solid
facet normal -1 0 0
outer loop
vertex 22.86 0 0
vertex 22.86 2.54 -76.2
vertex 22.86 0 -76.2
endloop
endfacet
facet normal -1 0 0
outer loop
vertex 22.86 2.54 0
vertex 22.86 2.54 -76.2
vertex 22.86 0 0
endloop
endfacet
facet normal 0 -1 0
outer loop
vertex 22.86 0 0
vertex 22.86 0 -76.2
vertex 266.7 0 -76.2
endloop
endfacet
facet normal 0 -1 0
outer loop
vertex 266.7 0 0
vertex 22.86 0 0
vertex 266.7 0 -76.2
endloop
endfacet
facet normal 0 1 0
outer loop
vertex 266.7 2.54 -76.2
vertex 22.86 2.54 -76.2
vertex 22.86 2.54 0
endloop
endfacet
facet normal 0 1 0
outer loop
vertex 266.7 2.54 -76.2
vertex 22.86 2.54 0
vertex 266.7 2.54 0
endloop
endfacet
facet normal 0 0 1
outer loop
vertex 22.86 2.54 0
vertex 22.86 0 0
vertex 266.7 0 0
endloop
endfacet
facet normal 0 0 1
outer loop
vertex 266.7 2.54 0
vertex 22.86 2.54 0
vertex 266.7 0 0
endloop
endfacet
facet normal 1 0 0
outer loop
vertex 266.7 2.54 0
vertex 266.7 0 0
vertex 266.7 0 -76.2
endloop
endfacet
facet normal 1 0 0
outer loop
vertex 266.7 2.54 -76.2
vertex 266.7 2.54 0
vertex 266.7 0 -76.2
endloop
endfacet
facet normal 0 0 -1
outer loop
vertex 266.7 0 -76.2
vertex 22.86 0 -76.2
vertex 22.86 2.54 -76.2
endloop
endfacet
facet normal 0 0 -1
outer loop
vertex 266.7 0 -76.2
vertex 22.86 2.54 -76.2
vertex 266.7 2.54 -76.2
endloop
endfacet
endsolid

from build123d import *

# Parameters (mm, degrees)
SKETCH2_W           = 266.7
SKETCH2_H           = 76.2
BOSS_EXTRUDE2_DEPTH = 2.54
SKETCH3_W           = 106.044360615
SKETCH3_H           = 67.366643484
CUT_EXTRUDE1_DEPTH  = 19.05
SKETCH4_W           = 100.655249905
SKETCH4_H           = 27.298305346
CUT_EXTRUDE2_DEPTH  = 3.81


with BuildPart() as part:
    # Sketch2 → Boss-Extrude2 (new body)
    with BuildSketch(Plane(origin=(0, 0, 0), x_dir=(1, 0, 0), z_dir=(0, 1, 0))):
        with Locations((133.35, 38.1)):
            Rectangle(SKETCH2_W, SKETCH2_H)
    extrude(amount=BOSS_EXTRUDE2_DEPTH)

    # Sketch3 → Cut-Extrude1 (cut)
    with BuildSketch(Plane.ZY):
        with Locations((-25.444736949, 3.487620746)):
            Rectangle(SKETCH3_W, SKETCH3_H)
    extrude(amount=-CUT_EXTRUDE1_DEPTH, mode=Mode.SUBTRACT)

    # Sketch4 → Cut-Extrude2 (cut)
    with BuildSketch(Plane.ZY.offset(-19.05)):
        with Locations((-42.160911607, -0.947161752)):
            Rectangle(SKETCH4_W, SKETCH4_H)
    extrude(amount=-CUT_EXTRUDE2_DEPTH, mode=Mode.SUBTRACT)


solid = part.part
